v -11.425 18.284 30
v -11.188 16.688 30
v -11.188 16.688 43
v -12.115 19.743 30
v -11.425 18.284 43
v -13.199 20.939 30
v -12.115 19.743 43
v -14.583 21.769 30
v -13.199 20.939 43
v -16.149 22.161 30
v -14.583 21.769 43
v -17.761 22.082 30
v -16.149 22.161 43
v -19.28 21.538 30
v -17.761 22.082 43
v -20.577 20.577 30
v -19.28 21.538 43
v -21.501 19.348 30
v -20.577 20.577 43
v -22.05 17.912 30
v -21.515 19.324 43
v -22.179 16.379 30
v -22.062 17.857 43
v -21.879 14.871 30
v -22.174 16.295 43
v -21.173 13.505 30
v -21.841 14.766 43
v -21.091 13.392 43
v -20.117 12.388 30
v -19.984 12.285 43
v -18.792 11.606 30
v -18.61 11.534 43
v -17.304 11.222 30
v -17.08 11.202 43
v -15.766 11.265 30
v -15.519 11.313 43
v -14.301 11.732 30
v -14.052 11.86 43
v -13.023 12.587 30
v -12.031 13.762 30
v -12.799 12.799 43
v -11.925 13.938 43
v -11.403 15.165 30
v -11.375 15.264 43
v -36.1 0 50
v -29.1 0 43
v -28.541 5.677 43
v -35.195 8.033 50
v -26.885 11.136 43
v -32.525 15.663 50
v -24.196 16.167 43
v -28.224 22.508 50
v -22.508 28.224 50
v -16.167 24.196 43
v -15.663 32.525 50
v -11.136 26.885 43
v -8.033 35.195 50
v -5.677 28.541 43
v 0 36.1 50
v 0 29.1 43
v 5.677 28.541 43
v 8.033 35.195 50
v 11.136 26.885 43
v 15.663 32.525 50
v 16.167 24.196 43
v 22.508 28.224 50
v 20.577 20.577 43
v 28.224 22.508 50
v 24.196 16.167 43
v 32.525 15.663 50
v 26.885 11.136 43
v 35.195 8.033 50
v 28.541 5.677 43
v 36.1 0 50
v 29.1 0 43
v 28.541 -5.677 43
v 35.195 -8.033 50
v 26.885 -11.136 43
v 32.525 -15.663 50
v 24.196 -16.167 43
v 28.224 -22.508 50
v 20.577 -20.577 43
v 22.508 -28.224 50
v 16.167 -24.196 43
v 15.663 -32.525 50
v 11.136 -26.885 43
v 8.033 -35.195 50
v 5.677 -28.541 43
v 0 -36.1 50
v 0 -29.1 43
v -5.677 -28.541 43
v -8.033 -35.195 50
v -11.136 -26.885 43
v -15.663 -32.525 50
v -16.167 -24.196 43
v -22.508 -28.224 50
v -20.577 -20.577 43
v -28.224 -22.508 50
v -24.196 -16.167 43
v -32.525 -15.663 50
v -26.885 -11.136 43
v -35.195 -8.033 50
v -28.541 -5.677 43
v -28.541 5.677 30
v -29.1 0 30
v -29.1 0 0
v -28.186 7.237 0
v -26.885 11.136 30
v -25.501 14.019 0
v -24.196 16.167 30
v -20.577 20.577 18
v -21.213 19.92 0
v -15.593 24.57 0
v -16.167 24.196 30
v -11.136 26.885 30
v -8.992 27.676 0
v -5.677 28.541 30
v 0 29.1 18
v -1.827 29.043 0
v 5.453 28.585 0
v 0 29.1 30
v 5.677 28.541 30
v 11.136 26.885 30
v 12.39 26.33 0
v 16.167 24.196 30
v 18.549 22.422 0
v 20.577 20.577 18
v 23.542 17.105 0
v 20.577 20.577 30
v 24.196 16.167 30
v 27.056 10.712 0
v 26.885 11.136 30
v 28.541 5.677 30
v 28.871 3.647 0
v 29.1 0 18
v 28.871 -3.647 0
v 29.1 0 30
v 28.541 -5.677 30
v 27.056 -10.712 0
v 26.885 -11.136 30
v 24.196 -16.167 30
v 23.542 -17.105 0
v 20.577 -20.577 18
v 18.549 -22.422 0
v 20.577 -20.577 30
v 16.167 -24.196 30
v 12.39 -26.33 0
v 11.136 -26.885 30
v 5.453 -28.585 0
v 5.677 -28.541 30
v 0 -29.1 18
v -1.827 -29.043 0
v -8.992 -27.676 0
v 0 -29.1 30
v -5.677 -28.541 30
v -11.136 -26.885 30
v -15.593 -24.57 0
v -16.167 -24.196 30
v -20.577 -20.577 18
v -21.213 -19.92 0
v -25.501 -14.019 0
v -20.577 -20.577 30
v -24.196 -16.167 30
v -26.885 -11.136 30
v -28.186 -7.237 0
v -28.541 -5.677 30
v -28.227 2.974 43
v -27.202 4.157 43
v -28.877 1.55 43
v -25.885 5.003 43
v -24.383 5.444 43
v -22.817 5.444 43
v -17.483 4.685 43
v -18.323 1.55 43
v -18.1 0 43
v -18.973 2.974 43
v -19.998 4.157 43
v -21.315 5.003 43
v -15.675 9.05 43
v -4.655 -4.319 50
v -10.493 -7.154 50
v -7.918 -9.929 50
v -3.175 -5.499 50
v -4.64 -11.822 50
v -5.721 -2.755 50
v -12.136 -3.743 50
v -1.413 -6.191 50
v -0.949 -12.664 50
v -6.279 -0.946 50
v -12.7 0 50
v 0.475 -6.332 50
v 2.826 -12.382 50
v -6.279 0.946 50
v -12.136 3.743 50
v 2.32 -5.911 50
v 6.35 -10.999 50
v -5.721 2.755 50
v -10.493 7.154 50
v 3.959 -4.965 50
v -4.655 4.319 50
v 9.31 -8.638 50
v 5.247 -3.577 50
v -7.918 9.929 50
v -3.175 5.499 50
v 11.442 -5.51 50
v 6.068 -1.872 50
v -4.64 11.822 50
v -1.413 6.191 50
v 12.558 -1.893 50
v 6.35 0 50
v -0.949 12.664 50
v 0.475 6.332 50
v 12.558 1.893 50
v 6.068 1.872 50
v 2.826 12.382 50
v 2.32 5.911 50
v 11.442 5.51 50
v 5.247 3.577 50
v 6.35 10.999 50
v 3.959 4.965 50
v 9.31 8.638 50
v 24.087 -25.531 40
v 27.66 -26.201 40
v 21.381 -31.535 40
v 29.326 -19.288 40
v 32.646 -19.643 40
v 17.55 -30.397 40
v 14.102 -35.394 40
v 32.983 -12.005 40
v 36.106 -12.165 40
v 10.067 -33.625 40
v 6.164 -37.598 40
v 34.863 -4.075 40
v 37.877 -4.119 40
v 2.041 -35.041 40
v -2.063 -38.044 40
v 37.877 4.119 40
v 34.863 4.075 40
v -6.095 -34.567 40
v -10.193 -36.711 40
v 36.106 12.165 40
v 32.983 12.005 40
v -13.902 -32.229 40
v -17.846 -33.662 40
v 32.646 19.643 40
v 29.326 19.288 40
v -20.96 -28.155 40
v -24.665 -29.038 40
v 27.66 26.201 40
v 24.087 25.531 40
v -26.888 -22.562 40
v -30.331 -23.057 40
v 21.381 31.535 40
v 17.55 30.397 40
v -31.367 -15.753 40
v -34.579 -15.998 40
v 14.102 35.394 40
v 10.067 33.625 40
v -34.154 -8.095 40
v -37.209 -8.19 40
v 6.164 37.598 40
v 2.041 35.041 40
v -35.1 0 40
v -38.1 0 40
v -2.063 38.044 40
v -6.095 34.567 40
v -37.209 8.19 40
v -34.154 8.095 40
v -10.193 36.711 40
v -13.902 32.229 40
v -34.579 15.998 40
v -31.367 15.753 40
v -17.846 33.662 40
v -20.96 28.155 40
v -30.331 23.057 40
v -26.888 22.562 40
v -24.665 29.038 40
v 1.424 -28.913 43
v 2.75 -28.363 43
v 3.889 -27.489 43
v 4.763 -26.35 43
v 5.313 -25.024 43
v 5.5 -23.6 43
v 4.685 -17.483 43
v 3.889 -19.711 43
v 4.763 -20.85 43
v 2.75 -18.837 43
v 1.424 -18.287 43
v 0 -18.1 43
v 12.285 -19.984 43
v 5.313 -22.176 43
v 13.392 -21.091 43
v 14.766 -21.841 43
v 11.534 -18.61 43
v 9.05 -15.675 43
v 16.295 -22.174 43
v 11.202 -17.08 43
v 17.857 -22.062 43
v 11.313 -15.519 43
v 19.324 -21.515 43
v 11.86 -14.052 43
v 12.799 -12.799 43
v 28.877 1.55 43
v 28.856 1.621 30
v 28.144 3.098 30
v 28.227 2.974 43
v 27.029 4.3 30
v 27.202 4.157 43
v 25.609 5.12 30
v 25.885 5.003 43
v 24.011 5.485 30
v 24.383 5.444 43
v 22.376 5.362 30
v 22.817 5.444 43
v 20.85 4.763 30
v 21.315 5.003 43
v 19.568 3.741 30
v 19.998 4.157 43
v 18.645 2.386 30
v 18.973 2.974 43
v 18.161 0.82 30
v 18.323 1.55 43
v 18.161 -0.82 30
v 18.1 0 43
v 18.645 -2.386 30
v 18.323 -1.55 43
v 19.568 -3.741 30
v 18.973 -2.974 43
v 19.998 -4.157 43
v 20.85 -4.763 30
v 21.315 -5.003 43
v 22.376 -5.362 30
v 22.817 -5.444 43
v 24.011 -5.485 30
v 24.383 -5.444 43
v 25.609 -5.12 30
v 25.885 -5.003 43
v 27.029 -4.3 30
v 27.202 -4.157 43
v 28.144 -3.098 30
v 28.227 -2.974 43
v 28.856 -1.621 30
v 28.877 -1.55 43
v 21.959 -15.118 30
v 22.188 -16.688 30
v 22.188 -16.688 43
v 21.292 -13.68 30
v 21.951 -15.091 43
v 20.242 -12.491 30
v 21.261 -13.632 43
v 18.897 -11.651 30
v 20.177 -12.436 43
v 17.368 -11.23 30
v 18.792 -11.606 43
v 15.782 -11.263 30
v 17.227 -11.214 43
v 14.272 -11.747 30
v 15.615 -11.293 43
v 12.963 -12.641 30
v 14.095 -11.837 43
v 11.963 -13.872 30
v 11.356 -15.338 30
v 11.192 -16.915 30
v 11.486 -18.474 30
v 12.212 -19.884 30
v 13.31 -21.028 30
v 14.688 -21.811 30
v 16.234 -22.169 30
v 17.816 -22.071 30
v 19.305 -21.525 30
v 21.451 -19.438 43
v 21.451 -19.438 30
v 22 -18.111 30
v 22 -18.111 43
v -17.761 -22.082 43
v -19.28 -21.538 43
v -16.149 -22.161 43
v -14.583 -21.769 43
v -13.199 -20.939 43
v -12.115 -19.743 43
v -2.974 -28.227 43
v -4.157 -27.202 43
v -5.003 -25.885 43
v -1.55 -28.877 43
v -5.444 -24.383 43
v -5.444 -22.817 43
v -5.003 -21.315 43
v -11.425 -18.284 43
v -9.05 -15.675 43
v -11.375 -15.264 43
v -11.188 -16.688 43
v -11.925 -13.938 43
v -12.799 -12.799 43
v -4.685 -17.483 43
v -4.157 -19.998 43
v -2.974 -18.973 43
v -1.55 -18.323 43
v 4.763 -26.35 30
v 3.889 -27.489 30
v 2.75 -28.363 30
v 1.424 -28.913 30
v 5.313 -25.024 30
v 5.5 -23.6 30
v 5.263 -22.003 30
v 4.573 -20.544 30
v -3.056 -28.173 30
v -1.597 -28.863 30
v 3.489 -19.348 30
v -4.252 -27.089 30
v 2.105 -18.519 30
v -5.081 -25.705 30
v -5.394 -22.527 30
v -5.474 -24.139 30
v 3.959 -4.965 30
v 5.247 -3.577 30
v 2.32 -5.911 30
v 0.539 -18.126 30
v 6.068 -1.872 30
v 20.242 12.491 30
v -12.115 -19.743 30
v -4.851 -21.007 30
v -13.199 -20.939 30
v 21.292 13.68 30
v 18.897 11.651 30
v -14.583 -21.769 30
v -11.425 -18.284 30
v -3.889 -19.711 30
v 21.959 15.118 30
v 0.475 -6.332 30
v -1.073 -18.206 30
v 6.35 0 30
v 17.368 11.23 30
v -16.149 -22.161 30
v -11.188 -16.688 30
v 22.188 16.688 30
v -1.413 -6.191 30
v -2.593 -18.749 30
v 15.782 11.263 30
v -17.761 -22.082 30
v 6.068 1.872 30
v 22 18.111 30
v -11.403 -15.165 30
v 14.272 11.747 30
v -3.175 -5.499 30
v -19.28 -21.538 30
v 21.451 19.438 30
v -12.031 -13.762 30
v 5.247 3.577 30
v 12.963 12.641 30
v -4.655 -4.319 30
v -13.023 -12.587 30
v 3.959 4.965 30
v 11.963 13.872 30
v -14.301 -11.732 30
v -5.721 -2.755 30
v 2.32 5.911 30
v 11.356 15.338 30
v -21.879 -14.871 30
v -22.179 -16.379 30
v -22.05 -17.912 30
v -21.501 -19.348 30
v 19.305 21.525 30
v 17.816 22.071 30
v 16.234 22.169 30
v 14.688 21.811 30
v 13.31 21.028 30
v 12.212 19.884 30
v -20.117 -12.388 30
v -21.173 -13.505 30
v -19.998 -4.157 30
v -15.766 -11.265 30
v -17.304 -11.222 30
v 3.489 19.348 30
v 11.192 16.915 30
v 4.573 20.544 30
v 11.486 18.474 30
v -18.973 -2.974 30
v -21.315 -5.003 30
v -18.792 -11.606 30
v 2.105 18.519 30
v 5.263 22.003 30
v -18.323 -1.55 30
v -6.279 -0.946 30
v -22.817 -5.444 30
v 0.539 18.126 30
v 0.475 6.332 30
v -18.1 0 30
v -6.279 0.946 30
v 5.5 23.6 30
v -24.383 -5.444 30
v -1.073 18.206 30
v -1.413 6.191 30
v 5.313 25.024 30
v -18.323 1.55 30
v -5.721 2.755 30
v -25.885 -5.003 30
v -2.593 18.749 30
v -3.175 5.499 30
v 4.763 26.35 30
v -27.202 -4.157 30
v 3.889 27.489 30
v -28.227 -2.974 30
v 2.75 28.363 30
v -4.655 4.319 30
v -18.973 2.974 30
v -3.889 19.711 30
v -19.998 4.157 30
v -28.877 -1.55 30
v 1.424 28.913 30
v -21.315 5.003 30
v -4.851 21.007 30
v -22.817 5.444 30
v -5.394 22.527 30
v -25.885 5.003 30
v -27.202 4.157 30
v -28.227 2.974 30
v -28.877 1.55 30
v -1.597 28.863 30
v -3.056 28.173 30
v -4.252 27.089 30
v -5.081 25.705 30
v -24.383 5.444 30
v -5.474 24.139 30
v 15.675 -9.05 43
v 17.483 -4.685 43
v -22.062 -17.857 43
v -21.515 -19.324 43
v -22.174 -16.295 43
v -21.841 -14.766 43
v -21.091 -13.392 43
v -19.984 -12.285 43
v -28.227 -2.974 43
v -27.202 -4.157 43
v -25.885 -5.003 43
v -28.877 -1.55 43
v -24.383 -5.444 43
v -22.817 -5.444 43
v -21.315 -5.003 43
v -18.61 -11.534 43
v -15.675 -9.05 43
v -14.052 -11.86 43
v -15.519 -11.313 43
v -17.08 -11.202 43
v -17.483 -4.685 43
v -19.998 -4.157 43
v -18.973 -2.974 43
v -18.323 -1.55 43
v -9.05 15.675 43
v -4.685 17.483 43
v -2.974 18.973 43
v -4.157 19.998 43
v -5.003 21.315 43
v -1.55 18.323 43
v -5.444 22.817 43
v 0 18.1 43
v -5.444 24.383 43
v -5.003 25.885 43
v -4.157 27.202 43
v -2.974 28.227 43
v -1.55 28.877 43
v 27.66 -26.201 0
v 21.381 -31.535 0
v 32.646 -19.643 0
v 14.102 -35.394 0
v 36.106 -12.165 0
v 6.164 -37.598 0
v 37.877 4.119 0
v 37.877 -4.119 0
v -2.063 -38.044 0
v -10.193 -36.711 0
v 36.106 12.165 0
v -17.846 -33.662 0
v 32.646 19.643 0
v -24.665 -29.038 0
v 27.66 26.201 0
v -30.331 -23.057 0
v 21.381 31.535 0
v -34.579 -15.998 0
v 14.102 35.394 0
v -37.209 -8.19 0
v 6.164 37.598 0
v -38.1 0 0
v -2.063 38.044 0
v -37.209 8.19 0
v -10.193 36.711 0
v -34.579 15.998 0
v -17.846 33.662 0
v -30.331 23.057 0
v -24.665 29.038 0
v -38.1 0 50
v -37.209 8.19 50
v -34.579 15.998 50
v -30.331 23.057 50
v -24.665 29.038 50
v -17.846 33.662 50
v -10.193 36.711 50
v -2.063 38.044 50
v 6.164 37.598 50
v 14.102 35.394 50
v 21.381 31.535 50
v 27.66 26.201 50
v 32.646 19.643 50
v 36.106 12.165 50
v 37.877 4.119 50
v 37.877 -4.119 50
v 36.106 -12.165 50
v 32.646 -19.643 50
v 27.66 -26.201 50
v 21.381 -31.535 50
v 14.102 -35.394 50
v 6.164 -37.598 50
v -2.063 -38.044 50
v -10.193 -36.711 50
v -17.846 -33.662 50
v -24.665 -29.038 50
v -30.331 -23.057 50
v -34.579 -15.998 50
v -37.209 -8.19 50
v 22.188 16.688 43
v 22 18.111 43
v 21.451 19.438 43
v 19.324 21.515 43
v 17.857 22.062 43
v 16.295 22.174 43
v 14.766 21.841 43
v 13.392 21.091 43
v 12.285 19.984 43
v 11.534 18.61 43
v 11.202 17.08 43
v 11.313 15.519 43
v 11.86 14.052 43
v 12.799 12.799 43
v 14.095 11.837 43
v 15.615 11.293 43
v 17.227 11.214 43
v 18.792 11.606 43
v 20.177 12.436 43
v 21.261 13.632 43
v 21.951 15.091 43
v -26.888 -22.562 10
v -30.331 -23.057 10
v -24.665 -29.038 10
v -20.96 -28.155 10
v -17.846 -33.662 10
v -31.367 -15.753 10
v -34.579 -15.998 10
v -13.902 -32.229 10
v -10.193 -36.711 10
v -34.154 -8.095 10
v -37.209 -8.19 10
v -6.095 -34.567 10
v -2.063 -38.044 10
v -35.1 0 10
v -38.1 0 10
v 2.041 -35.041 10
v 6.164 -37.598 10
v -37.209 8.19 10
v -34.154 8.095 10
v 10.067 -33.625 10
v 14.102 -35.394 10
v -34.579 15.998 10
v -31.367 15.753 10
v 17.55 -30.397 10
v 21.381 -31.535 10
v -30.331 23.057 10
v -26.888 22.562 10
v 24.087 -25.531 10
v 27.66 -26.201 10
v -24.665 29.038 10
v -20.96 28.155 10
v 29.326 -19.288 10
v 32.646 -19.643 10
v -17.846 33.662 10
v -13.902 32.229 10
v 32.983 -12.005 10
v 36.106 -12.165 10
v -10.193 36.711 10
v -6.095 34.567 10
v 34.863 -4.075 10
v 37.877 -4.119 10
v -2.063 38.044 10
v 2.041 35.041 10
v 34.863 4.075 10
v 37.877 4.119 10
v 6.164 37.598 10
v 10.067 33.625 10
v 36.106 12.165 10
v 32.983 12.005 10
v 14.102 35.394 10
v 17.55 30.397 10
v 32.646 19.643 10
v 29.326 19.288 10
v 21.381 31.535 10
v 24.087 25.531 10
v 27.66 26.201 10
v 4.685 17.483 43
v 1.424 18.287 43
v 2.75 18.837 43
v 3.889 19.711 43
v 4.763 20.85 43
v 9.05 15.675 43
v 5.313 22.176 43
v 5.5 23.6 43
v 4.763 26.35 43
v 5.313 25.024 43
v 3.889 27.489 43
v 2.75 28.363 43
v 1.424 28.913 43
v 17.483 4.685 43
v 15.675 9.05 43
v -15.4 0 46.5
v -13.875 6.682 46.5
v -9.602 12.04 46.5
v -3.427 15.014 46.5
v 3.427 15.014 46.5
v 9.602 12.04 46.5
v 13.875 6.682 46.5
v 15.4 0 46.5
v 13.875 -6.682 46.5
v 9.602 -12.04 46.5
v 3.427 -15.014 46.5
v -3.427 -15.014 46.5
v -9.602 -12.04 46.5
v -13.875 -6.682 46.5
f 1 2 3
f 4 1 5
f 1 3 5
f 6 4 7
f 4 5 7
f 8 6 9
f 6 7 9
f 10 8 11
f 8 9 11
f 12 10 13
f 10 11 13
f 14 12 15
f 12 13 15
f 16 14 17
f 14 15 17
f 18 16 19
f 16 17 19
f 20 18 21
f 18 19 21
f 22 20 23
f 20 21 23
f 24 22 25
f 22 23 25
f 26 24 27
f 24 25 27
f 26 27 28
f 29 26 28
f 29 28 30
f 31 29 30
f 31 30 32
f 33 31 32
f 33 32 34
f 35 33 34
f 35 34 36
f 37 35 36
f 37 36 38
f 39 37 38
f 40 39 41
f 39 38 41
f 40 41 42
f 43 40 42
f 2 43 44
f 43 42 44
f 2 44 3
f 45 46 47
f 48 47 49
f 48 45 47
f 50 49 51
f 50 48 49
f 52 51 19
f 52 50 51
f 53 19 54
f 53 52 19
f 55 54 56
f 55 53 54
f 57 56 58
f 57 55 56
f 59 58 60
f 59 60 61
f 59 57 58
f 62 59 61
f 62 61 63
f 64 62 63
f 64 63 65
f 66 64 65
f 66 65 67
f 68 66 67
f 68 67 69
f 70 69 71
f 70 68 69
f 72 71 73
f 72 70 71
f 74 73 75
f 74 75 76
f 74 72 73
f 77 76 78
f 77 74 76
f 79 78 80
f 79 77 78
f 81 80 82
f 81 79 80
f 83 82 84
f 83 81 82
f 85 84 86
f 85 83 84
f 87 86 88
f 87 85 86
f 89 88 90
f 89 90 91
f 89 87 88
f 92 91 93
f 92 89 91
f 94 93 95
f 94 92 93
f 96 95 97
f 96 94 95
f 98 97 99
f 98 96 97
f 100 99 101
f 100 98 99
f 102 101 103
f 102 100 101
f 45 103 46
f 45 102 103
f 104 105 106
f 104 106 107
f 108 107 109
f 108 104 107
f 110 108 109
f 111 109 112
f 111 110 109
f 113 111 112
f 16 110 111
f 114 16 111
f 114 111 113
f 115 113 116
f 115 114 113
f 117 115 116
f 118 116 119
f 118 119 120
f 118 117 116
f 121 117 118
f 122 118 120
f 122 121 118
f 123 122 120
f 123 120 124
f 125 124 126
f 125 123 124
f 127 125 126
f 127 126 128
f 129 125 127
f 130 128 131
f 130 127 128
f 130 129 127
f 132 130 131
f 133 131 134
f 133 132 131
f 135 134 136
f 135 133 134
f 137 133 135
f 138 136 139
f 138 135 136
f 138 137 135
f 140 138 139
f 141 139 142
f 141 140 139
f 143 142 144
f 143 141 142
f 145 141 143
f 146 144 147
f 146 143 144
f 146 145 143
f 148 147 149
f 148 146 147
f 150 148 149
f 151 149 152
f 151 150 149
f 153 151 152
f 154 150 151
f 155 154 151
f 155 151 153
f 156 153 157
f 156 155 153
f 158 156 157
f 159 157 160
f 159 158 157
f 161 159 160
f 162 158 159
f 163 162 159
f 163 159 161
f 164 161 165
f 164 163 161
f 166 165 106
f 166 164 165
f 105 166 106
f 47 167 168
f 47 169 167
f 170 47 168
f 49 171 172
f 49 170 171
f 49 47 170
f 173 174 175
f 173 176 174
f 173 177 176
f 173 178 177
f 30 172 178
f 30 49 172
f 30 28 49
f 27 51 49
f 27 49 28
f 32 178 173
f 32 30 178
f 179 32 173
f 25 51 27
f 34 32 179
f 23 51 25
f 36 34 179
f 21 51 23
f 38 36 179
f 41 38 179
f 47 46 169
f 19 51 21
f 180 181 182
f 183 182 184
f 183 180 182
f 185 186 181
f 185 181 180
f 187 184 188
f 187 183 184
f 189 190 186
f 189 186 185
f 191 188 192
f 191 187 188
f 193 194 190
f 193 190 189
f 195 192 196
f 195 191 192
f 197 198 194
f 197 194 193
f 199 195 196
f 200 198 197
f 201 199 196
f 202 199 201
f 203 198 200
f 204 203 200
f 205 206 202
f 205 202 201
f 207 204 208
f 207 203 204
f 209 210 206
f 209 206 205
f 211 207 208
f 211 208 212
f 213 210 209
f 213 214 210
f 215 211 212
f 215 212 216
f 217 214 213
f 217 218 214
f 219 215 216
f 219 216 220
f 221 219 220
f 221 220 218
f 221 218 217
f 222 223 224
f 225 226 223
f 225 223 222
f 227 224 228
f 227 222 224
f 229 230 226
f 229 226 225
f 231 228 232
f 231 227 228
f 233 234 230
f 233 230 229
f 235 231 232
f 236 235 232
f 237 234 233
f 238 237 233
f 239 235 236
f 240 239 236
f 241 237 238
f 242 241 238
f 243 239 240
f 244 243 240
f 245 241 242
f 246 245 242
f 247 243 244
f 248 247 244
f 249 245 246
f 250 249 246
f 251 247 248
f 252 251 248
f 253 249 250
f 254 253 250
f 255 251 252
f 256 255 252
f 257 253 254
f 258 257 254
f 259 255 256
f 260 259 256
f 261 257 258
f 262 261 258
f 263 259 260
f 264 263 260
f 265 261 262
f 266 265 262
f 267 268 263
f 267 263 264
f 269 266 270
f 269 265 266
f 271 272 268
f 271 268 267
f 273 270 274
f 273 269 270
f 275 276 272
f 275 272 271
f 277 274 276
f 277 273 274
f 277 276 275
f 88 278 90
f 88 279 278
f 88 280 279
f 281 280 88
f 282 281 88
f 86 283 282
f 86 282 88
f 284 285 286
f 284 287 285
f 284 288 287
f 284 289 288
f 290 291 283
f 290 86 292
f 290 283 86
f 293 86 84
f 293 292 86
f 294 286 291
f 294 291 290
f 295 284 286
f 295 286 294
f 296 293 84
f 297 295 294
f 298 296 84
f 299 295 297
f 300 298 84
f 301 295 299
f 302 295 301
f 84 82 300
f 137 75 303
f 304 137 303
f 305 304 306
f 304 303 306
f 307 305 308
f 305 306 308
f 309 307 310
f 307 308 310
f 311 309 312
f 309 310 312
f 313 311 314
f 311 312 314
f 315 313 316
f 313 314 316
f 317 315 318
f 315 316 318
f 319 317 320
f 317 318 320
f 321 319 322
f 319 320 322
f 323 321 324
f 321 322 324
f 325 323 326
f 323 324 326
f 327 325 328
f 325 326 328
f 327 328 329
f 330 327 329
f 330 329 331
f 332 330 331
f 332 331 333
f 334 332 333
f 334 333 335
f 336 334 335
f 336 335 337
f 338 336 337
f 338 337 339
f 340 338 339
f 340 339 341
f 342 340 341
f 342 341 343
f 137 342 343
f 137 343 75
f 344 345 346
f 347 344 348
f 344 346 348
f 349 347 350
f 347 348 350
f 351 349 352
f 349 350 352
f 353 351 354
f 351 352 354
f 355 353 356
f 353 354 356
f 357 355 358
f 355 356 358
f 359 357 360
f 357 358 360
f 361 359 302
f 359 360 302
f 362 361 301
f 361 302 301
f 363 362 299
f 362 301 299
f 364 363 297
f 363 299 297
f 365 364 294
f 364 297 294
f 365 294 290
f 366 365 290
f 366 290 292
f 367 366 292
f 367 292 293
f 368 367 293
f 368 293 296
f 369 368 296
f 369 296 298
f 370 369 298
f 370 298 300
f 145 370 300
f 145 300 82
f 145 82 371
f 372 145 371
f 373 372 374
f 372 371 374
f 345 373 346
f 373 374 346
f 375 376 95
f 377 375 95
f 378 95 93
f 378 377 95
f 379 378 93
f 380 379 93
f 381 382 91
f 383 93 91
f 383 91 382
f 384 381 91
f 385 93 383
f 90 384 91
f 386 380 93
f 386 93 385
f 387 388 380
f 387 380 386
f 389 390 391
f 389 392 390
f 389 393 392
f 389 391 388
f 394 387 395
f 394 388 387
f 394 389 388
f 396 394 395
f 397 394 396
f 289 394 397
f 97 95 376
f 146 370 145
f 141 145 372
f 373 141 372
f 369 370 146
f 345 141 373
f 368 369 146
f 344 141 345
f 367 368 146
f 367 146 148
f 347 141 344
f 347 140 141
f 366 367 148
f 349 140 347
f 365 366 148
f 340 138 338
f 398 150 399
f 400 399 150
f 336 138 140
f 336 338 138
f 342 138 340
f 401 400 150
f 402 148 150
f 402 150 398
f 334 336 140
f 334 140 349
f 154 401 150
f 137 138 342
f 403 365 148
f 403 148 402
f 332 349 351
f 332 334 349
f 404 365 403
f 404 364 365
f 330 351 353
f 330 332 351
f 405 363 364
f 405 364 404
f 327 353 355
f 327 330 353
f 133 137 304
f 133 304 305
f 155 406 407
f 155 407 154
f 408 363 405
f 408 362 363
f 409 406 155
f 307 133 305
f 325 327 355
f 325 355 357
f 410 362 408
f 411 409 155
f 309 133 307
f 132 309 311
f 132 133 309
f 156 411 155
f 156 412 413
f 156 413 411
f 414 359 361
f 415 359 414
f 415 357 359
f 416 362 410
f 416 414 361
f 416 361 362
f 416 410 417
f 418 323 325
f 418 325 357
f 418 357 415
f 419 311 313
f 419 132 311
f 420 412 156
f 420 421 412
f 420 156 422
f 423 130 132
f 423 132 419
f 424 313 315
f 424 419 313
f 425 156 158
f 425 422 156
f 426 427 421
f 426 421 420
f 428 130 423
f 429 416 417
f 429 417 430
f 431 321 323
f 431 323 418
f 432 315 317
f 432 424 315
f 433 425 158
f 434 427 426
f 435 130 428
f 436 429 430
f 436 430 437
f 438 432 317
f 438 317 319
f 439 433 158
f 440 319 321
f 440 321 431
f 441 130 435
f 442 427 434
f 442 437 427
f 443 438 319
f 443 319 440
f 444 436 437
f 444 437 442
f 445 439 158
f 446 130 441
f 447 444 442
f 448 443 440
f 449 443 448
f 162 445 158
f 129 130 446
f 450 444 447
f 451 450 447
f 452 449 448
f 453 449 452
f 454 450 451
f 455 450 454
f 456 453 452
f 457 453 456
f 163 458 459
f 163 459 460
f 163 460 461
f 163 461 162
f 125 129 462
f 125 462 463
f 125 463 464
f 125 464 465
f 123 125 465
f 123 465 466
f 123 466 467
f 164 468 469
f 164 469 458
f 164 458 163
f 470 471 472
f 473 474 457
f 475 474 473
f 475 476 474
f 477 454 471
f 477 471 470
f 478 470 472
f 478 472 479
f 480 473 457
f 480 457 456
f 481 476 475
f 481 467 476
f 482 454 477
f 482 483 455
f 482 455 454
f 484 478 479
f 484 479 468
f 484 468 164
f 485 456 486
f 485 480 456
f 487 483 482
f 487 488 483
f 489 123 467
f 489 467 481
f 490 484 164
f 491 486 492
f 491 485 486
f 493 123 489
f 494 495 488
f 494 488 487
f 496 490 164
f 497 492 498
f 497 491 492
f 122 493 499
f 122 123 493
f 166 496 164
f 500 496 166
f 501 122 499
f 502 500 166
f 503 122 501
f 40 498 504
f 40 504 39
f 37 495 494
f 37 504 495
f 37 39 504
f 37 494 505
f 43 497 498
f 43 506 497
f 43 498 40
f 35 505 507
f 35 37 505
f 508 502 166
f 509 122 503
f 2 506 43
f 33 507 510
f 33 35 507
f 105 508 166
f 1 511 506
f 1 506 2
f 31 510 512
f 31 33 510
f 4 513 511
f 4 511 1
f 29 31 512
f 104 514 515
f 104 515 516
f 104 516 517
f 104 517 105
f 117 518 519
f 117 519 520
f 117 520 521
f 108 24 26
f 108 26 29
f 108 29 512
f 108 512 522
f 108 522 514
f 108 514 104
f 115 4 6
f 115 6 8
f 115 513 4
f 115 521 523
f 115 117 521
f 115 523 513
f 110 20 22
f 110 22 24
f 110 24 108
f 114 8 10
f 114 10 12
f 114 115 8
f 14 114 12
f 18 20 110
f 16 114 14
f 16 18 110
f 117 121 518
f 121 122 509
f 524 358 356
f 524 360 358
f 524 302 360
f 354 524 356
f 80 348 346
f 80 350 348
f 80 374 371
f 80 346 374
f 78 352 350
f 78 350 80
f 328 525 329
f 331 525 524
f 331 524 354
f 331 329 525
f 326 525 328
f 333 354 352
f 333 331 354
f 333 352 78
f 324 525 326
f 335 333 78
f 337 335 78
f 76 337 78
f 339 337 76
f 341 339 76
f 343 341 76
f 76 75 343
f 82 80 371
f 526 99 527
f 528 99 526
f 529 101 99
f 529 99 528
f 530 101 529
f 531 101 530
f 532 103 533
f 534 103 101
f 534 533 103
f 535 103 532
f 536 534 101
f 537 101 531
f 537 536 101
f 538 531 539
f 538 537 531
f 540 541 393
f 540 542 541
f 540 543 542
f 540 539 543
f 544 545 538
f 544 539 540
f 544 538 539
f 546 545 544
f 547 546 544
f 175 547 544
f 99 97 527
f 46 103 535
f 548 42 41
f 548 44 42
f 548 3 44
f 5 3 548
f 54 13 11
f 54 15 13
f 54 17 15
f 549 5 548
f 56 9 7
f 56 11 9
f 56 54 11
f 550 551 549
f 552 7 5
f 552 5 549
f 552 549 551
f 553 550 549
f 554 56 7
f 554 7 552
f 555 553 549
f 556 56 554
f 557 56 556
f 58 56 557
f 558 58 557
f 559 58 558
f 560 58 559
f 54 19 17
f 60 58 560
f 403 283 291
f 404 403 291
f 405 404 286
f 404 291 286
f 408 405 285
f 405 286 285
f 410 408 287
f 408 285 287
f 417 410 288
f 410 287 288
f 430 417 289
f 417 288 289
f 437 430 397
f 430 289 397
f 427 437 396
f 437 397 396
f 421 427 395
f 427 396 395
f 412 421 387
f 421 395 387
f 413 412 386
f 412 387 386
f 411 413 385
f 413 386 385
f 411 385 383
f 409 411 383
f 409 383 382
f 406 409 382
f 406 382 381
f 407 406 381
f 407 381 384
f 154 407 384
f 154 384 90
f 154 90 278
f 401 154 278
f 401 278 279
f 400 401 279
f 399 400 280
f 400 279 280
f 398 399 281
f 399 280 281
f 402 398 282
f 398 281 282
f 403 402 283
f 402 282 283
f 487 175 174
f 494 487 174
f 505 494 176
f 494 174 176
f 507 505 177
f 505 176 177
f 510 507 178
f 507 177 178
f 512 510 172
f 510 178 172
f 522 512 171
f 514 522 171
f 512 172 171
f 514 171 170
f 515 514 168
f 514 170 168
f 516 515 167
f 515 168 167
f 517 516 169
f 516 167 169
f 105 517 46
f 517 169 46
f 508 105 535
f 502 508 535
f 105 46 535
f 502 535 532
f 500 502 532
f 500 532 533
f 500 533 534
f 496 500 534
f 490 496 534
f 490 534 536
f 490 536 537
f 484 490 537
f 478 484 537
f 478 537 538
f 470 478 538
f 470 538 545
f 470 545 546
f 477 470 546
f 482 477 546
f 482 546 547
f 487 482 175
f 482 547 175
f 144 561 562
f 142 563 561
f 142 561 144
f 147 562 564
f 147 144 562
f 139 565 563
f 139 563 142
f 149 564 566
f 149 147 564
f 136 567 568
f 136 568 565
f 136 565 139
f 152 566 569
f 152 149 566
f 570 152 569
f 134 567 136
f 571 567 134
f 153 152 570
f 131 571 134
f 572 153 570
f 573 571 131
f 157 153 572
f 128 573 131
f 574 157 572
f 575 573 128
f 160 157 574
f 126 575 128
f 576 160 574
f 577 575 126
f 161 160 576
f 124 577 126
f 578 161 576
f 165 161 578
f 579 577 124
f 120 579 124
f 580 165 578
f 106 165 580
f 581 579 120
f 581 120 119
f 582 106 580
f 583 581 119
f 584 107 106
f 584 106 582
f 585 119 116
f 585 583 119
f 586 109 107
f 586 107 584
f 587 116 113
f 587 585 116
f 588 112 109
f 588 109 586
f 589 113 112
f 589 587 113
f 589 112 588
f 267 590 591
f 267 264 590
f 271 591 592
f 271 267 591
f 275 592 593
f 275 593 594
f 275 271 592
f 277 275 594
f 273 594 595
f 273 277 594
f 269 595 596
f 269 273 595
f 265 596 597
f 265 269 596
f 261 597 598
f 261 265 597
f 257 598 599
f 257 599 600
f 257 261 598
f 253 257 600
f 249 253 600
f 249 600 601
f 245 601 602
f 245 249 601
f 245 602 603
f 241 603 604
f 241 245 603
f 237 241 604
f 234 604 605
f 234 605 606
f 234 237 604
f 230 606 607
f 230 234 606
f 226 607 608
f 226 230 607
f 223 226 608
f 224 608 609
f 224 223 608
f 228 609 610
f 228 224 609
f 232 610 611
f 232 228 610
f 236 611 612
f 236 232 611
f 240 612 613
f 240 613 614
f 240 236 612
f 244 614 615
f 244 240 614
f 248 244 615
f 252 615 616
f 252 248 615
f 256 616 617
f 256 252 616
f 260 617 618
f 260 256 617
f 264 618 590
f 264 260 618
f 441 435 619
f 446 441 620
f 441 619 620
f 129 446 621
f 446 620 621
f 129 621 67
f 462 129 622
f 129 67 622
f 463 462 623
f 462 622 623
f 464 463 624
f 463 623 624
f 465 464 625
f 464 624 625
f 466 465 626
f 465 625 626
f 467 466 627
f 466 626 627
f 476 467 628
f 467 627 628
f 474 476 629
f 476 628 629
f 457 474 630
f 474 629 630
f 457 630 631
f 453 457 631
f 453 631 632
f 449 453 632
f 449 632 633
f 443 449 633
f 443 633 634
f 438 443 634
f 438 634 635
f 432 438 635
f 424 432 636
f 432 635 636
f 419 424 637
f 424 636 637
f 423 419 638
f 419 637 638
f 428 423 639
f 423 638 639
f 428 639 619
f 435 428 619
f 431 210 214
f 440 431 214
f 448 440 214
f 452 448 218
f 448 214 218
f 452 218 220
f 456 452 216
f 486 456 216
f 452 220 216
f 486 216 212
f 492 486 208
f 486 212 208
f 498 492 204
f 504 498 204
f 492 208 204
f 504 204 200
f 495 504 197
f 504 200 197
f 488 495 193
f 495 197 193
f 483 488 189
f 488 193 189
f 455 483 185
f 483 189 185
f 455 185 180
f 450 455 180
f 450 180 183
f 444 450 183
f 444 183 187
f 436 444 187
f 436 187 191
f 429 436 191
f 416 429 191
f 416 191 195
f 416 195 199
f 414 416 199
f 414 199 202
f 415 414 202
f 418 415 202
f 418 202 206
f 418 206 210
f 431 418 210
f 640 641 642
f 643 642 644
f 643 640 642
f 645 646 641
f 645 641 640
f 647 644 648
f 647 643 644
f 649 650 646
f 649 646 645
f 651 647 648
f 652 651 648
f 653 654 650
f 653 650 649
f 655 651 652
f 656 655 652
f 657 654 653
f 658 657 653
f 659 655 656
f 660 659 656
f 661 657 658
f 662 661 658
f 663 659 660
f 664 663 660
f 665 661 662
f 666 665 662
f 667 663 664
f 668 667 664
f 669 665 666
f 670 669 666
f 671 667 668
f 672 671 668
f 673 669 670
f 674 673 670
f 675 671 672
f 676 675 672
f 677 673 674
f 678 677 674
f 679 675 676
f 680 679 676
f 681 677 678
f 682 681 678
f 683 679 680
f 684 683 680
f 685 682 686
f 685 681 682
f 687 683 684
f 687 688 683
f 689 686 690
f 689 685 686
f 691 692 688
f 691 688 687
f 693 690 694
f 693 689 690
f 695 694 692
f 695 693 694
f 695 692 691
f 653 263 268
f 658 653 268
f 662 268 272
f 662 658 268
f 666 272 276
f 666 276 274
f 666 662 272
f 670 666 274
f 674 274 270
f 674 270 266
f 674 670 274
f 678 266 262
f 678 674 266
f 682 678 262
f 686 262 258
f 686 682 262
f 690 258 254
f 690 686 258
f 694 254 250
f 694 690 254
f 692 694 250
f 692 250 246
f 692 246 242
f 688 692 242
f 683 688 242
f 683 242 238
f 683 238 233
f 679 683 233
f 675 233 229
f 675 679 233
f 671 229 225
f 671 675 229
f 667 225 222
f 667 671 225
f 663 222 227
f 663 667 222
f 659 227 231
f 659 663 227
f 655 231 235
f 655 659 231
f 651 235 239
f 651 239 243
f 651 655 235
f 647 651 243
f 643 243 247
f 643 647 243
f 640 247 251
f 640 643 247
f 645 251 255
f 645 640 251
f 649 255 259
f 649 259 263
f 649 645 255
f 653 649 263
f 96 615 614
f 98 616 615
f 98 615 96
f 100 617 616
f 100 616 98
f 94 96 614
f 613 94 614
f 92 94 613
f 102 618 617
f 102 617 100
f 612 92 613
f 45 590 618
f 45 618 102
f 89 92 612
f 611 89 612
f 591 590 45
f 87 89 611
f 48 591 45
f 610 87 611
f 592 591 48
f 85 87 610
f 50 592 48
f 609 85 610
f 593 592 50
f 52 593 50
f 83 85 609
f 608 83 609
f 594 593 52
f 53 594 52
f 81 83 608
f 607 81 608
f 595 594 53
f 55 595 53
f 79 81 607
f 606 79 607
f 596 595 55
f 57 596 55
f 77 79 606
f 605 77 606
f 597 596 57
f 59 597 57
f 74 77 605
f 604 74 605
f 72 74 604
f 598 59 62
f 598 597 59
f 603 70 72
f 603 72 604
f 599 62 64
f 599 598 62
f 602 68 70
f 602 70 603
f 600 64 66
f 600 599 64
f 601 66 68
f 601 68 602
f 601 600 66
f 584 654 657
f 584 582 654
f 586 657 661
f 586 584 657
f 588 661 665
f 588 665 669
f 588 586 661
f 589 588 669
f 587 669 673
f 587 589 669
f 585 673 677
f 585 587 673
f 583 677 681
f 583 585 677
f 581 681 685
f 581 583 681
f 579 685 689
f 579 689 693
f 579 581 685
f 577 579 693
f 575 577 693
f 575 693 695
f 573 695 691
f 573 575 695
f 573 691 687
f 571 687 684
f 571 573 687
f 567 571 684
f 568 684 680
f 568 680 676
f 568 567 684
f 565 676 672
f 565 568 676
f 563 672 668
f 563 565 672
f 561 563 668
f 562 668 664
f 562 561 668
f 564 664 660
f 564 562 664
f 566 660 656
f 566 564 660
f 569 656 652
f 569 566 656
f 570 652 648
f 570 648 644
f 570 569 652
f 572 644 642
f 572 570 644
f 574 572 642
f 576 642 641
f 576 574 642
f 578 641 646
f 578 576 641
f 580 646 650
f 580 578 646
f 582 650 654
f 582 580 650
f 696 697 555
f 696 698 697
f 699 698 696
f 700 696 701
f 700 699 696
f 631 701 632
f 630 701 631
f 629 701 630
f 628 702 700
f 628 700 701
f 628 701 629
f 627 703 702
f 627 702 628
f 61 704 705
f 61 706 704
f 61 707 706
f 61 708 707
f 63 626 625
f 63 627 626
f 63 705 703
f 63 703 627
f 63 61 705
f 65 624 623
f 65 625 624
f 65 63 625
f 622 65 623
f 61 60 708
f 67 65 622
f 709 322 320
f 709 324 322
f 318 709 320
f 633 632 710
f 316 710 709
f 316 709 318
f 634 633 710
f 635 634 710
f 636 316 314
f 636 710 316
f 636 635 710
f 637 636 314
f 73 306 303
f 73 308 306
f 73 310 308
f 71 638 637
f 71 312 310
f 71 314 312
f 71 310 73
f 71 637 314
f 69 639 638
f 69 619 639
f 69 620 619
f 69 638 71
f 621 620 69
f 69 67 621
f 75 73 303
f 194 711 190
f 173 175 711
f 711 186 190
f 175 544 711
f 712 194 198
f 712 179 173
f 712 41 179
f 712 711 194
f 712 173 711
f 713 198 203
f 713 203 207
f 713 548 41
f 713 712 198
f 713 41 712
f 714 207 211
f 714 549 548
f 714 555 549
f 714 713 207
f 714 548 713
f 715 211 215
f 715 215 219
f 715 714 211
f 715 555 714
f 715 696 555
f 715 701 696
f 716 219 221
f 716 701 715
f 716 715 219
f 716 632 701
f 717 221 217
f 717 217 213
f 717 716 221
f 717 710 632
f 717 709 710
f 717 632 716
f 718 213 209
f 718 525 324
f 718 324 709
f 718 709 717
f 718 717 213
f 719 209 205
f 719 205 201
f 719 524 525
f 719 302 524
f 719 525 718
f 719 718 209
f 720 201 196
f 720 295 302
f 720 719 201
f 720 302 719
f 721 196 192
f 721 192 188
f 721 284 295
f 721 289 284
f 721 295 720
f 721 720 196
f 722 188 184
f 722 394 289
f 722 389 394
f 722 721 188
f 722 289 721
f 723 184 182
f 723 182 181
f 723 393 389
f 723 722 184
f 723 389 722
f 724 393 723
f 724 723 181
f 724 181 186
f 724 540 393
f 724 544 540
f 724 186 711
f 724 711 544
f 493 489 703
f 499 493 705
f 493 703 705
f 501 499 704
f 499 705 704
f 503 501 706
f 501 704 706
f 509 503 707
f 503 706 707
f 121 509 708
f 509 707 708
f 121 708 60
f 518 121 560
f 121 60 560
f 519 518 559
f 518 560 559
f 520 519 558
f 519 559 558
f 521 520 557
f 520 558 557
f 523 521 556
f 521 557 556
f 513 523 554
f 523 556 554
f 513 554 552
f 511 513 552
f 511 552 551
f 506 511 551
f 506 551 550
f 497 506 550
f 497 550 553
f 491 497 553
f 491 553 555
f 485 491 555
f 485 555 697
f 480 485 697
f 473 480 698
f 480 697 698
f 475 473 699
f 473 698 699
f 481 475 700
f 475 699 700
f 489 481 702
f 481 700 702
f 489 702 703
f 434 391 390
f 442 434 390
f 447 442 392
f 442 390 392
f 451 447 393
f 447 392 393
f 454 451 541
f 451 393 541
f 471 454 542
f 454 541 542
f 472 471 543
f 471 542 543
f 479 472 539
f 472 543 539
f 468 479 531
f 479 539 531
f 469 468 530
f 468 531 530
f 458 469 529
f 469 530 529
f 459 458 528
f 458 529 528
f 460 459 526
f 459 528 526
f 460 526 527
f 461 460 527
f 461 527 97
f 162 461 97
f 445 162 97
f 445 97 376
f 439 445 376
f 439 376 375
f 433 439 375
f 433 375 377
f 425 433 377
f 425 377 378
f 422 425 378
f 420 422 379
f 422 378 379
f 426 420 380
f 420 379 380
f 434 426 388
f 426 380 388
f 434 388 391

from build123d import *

# Parameters (mm, degrees)
F2_R     = 5.5
F3_DEPTH = 25
F4_R     = 6.35
F5_DEPTH = 25


with BuildPart() as f1:
    # F0 (on Front) → F1 (revolve)
    with BuildSketch(Plane.XZ):
        Polygon((-38.1, 50), (-38.1, 40), (-35.1, 40), (-35.1, 10), (-38.1, 10), (-38.1, 0), (-35.1, 0), (-29.1, 0), (-29.1, 30), (0, 30), (0, 50), (-12.7, 50), (-18.1, 43), (-29.1, 43), (-36.1, 50), align=None)
    revolve(axis=Axis((0, 0, 40), (0, 0, -1)))

    # F2 (on face) → F3 (cut)
    with BuildSketch(Plane.XY.offset(43)):
        with Locations((-23.6, 0)):
            Circle(F2_R)
        with Locations((-16.68772, -16.68772)):
            Circle(F2_R)
        with Locations((0, -23.6)):
            Circle(F2_R)
        with Locations((16.68772, -16.68772)):
            Circle(F2_R)
        with Locations((23.6, 0)):
            Circle(F2_R)
        with Locations((16.68772, 16.68772)):
            Circle(F2_R)
        with Locations((0, 23.6)):
            Circle(F2_R)
        with Locations((-16.68772, 16.68772)):
            Circle(F2_R)
    extrude(amount=-F3_DEPTH, mode=Mode.SUBTRACT)

    # F4 (on face) → F5 (cut)
    with BuildSketch(Plane.XY.offset(50)):
        Circle(F4_R)
    extrude(amount=-F5_DEPTH, mode=Mode.SUBTRACT)


solid = f1.part
